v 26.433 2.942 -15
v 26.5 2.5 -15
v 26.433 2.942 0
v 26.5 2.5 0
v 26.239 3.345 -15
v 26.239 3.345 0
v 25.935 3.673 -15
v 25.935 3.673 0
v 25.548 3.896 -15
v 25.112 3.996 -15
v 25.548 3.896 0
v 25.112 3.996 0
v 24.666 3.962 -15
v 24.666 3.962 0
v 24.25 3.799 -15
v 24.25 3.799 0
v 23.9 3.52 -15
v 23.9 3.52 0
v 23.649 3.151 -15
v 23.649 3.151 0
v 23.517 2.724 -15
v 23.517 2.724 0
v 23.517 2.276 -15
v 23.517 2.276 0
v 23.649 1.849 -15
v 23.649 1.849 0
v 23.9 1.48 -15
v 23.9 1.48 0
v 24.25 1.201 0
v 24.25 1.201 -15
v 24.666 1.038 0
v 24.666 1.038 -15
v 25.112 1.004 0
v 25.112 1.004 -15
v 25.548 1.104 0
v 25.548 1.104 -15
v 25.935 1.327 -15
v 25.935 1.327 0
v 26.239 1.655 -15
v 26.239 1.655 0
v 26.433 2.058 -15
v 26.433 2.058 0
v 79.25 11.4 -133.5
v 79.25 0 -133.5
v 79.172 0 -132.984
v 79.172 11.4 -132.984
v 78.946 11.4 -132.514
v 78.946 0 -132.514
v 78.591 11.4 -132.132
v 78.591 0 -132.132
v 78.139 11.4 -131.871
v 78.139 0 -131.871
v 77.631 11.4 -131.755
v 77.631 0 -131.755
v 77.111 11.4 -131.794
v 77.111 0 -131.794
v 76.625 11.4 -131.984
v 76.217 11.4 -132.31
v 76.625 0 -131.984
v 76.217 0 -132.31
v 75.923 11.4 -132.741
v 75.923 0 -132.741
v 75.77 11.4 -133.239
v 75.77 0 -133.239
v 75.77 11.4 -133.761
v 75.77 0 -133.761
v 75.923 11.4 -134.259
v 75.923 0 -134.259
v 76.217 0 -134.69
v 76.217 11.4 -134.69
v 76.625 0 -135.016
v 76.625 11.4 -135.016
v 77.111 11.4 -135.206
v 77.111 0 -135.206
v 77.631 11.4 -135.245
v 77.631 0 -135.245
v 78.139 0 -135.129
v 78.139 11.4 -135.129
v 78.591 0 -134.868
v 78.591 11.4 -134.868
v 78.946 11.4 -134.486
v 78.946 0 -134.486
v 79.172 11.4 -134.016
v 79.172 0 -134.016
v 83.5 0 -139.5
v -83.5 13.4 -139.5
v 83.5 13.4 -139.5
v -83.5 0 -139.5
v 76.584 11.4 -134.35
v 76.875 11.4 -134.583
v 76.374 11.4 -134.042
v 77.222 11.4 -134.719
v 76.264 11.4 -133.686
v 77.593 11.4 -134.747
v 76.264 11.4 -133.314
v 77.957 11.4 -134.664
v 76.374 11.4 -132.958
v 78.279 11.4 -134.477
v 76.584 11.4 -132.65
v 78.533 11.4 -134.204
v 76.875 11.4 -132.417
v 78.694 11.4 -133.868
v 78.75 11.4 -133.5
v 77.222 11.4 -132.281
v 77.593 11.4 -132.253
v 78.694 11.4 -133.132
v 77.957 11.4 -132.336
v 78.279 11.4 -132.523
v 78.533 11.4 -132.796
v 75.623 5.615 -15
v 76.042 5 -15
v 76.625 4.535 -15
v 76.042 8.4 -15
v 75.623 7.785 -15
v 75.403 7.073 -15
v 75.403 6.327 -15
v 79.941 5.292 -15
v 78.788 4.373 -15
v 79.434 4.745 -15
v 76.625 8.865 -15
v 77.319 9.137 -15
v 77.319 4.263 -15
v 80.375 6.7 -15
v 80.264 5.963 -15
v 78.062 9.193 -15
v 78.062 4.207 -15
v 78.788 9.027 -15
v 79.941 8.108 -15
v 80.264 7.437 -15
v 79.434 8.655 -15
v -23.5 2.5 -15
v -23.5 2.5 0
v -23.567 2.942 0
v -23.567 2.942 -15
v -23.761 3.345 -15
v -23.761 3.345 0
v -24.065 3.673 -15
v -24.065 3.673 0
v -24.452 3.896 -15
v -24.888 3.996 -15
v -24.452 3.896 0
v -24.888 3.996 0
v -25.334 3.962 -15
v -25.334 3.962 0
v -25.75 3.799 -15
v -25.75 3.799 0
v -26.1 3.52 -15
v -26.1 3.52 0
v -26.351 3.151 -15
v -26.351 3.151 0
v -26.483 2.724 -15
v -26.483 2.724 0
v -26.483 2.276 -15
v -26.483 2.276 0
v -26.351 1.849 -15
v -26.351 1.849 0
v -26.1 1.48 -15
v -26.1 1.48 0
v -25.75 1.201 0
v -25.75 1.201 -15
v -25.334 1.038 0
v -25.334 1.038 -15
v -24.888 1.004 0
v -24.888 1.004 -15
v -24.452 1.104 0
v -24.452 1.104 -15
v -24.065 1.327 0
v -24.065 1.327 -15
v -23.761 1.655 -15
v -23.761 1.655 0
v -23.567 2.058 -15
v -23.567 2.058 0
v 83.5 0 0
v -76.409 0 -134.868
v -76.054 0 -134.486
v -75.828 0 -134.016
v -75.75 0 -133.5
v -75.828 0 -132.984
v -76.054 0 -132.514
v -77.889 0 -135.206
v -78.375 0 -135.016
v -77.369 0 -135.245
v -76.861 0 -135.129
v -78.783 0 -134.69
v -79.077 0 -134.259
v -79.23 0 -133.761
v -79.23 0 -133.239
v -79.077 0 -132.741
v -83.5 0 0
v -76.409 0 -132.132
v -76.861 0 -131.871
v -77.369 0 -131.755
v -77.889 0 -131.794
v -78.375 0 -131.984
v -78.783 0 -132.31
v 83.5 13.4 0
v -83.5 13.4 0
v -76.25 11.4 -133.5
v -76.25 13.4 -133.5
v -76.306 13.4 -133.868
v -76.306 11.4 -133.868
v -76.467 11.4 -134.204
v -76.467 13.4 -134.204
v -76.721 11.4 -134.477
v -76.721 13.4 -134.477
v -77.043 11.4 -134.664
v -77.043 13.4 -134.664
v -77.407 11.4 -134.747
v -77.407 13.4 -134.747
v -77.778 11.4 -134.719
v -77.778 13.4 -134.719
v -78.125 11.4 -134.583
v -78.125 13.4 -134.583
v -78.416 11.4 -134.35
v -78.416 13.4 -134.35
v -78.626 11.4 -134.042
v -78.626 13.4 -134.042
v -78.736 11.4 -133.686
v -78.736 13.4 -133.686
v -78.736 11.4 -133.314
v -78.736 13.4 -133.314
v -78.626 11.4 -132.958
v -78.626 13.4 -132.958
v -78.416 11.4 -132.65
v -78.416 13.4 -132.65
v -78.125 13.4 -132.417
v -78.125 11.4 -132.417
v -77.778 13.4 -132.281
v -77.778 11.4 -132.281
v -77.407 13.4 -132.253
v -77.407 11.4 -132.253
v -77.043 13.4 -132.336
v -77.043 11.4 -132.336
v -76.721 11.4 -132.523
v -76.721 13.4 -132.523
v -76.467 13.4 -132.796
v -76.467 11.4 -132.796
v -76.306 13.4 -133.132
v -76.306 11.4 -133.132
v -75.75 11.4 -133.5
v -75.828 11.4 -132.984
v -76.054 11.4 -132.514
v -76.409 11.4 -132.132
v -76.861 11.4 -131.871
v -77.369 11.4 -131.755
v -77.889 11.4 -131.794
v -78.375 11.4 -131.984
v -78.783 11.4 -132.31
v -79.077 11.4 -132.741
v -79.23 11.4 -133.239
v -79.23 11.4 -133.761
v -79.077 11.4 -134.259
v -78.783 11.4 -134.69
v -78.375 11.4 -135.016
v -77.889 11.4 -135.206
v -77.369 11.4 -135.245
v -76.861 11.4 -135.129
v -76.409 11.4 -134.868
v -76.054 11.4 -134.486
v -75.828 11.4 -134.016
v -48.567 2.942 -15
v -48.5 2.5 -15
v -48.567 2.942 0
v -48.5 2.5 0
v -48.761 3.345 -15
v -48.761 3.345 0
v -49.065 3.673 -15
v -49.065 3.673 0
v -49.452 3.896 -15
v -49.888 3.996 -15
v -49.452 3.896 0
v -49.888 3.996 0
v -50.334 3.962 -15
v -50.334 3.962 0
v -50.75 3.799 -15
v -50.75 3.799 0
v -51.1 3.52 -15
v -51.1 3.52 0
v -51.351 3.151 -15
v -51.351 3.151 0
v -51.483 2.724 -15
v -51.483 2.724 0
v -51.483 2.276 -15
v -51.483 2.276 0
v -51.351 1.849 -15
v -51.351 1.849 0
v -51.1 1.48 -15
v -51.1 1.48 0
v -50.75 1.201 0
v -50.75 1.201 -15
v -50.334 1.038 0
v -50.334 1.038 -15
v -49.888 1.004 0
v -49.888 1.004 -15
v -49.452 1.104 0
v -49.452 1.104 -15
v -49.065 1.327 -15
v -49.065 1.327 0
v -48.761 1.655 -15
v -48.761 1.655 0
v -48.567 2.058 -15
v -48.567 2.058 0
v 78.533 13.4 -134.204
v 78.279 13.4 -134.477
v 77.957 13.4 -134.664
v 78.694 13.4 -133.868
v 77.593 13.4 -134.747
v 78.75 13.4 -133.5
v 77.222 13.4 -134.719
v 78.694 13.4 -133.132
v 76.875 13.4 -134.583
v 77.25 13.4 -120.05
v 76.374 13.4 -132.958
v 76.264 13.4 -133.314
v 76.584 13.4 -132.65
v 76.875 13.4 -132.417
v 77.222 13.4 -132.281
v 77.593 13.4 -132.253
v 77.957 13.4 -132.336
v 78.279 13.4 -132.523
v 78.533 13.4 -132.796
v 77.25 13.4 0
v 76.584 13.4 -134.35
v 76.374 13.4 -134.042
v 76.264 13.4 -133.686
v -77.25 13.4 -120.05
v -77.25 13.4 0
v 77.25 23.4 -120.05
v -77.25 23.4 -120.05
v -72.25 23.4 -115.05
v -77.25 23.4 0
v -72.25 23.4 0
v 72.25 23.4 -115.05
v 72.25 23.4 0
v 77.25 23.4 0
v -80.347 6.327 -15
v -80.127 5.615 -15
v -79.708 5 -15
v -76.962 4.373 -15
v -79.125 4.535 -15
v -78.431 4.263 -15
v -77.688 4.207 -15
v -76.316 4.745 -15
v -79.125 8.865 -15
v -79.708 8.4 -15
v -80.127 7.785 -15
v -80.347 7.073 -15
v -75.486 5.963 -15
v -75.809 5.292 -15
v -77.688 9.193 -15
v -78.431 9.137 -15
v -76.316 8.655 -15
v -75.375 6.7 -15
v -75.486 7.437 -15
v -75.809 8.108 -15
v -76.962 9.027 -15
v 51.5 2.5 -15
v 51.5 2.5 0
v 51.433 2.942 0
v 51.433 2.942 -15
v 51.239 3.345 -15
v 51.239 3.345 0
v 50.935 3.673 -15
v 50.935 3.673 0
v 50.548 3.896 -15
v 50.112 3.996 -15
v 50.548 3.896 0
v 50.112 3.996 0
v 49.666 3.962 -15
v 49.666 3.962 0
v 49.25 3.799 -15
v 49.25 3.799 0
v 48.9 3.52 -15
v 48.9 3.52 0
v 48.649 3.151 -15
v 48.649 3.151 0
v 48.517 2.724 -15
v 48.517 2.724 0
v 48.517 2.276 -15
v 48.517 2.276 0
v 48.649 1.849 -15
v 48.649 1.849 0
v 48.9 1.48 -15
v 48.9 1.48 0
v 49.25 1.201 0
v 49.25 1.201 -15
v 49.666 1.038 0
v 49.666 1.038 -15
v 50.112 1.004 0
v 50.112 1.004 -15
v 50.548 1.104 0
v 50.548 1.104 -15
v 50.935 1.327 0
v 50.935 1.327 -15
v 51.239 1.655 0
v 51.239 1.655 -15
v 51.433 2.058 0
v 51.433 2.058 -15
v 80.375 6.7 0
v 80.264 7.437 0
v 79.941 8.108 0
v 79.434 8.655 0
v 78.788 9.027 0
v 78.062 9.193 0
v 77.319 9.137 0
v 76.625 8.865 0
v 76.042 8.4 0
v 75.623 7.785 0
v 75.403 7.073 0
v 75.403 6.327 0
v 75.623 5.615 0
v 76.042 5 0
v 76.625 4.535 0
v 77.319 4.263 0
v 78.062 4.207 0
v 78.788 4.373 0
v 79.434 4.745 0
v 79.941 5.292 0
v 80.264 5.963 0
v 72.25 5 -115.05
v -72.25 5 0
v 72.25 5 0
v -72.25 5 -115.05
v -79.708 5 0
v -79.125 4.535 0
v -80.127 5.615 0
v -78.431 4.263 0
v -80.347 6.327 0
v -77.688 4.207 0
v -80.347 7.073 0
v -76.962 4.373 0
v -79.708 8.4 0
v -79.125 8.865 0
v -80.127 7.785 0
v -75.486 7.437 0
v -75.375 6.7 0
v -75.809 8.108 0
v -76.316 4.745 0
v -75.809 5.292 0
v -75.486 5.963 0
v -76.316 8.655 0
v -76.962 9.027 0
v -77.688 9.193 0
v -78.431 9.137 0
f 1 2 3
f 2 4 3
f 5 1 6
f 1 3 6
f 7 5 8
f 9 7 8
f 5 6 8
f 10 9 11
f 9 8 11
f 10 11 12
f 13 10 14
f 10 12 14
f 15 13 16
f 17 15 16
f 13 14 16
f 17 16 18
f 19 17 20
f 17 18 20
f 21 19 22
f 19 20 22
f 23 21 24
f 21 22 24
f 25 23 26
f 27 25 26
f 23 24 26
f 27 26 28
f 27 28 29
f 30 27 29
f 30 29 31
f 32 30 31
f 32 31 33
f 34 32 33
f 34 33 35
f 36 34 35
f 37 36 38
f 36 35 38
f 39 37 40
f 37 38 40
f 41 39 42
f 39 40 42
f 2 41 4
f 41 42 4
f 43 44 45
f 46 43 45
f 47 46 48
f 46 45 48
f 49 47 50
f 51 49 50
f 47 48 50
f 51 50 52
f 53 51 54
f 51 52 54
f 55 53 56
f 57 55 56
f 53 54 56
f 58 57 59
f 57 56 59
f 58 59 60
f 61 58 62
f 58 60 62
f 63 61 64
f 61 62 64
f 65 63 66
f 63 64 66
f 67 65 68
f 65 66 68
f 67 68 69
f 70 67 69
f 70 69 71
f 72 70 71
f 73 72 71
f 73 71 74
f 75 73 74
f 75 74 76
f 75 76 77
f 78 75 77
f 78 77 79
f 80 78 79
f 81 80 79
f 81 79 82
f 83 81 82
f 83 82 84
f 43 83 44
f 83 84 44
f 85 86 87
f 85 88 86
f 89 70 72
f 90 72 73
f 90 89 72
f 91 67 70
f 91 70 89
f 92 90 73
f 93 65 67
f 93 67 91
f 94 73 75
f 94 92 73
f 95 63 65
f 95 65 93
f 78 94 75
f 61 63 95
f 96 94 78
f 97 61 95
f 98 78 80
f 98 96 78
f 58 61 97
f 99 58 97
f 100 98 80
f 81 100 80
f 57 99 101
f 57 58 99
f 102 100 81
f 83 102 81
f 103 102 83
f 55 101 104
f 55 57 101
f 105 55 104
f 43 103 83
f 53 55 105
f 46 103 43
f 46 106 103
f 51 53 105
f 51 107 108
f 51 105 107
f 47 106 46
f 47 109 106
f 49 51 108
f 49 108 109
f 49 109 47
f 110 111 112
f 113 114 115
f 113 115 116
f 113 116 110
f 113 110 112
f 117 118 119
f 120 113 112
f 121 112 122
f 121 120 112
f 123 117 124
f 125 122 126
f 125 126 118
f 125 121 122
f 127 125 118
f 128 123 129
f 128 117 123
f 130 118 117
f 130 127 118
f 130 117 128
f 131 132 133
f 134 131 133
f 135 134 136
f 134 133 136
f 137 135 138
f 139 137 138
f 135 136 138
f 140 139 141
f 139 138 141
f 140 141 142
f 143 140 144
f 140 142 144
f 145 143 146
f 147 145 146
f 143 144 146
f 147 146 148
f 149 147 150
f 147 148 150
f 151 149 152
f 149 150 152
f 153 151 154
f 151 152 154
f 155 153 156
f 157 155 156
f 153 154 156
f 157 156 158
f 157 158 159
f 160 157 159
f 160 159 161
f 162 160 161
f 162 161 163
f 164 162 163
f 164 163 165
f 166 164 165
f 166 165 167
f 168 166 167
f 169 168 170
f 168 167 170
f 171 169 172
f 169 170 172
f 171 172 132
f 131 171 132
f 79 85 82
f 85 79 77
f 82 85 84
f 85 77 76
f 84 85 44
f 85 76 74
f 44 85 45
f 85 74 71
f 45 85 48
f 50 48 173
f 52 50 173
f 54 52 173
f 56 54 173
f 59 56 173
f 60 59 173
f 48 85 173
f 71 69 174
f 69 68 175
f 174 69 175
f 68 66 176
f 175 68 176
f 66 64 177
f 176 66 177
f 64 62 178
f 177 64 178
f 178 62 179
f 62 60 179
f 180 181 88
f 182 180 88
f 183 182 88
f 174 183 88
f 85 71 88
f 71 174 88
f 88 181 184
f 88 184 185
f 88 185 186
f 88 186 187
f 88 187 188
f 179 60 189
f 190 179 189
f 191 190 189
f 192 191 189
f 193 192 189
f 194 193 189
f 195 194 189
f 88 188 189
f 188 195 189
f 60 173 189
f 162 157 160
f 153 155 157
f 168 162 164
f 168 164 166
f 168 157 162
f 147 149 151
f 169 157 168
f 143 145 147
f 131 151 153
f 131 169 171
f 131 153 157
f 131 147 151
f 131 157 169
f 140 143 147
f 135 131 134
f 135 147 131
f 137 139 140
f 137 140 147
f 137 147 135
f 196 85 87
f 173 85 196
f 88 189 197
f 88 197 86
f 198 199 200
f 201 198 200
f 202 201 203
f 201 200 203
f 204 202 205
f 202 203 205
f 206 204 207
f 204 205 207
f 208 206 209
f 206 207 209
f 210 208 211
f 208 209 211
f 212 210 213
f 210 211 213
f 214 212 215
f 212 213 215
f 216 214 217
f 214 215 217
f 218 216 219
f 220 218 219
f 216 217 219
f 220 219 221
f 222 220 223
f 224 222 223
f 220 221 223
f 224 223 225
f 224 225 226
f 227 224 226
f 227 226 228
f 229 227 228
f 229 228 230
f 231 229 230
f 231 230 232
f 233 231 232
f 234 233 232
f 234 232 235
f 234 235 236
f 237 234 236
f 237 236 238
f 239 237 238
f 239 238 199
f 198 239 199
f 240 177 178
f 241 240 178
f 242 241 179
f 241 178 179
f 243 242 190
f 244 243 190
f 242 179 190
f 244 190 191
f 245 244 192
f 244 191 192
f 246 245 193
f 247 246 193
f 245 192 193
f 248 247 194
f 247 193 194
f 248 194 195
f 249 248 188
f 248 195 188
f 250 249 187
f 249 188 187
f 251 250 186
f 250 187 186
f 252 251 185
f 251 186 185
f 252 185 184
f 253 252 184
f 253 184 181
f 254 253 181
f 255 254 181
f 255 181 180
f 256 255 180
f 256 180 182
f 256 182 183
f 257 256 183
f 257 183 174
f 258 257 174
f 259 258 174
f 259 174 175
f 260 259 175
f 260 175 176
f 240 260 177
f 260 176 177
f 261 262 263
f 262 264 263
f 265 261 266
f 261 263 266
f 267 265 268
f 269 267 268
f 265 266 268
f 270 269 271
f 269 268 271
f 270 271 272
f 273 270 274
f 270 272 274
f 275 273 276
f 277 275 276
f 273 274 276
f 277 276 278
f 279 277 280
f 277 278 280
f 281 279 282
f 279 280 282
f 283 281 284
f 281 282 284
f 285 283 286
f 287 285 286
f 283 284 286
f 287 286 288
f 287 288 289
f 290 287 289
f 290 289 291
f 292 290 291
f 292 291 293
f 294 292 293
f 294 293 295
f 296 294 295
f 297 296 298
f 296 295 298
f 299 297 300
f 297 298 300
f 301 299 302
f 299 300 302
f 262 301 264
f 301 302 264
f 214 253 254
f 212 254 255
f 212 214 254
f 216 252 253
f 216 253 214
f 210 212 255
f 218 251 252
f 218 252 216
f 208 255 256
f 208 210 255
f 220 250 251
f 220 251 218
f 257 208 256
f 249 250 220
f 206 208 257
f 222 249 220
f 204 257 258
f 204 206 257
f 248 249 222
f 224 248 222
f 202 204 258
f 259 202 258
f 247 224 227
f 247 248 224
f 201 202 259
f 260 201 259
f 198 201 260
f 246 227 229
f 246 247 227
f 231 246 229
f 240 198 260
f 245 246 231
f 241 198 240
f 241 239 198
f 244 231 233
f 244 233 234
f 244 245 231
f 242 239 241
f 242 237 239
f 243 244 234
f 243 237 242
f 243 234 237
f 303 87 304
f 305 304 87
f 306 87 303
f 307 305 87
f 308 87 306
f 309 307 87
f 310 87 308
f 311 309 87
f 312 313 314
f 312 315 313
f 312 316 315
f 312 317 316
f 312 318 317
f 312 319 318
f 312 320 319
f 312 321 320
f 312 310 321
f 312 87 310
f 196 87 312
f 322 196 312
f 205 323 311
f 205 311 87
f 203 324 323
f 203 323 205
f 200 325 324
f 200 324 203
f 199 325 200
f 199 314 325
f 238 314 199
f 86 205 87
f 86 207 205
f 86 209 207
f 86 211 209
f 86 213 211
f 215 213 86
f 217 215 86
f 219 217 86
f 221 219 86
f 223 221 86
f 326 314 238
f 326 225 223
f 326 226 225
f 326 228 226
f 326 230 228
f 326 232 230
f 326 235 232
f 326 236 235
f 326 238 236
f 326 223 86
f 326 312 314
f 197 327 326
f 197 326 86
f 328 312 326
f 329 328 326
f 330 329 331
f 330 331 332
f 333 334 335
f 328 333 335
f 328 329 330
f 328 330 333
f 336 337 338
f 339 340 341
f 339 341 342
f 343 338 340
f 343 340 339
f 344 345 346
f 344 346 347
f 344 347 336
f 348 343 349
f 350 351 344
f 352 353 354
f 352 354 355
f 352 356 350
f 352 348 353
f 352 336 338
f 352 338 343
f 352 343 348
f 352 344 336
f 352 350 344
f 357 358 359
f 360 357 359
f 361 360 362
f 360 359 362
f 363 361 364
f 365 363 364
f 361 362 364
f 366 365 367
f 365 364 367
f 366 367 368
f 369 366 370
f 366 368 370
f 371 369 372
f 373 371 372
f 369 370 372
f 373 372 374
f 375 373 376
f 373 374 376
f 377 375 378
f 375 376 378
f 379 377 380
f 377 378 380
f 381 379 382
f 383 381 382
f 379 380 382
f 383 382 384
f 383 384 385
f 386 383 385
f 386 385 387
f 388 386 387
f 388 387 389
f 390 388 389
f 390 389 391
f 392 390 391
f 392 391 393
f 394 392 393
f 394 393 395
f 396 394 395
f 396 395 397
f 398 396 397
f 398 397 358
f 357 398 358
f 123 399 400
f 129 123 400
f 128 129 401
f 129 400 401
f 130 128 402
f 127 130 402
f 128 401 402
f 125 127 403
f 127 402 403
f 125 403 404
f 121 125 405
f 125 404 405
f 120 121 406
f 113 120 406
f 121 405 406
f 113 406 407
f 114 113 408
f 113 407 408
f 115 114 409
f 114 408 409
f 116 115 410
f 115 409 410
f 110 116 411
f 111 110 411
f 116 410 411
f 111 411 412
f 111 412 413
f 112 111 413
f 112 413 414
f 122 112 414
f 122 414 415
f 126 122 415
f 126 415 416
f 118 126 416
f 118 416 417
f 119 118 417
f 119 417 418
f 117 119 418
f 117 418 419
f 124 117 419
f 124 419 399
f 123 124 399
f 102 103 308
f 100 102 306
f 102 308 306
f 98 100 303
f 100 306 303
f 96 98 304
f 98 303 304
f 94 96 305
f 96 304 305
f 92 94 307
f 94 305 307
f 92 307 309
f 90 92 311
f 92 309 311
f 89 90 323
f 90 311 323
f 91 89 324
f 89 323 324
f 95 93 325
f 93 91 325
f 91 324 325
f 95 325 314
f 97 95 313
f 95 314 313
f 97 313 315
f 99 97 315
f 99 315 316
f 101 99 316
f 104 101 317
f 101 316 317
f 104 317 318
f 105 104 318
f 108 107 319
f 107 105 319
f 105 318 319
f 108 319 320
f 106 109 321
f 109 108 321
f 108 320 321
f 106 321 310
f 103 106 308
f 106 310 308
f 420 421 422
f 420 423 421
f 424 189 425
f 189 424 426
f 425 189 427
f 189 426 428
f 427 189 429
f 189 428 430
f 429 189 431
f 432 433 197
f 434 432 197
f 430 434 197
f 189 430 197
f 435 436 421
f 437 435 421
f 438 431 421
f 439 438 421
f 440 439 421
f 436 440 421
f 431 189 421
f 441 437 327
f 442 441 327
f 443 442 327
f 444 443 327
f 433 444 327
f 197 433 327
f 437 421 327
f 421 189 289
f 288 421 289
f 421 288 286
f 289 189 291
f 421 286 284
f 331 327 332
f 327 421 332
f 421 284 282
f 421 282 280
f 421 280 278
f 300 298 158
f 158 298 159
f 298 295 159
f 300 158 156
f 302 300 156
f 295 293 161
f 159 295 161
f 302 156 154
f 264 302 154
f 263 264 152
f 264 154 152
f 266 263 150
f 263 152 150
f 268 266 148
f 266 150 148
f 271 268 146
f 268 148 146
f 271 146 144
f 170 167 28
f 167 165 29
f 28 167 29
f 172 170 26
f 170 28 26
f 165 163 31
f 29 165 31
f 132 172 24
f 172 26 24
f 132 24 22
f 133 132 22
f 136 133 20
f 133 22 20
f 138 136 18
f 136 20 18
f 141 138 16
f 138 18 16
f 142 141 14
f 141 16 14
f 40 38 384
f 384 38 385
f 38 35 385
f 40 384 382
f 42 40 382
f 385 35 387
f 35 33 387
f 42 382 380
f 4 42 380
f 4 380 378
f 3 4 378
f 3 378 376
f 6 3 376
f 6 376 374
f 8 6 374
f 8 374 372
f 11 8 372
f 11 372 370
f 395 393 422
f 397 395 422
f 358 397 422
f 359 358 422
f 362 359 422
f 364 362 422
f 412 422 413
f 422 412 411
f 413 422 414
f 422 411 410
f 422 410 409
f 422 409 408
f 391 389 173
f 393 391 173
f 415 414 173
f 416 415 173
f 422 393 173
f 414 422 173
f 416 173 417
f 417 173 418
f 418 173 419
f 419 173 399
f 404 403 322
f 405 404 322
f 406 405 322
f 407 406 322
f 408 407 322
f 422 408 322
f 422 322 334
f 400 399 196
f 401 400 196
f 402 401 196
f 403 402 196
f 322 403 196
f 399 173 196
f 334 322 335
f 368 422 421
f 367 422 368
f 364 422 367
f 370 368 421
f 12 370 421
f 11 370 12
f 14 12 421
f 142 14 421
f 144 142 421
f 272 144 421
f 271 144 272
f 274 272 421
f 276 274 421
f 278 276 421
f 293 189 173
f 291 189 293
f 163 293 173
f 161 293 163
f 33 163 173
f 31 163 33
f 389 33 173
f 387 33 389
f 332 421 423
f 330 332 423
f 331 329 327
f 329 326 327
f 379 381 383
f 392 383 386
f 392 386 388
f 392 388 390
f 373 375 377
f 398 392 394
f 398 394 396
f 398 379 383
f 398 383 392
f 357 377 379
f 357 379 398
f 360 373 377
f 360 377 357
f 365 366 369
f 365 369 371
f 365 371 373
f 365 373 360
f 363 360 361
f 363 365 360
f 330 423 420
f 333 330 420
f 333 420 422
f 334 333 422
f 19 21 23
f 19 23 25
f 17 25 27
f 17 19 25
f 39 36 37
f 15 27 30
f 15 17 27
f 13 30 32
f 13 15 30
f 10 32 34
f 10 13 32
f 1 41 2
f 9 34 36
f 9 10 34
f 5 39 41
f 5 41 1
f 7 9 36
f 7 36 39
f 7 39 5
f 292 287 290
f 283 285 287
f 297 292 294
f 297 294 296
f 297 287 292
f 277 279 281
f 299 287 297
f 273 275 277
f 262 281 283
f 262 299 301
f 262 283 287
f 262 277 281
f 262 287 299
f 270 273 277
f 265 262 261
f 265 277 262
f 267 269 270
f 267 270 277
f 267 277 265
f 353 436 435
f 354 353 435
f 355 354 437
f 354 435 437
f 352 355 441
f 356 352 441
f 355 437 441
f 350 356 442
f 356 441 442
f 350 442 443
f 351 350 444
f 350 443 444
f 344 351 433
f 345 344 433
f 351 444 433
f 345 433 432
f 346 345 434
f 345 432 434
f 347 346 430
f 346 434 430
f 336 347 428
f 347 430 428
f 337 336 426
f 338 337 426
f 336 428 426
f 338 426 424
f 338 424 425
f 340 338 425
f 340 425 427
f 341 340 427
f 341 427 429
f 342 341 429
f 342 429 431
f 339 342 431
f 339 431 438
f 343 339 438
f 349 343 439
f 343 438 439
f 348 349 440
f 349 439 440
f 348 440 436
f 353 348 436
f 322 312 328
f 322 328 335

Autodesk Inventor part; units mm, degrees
ref_plane "YZ Plane" through (0, 0, 0) normal (1, 0, 0) x (0, 1, 0)
ref_plane "XZ Plane" through (0, 0, 0) normal (0, 1, 0) x (-1, 0, 0)
sketch "Sketch1" plane through (0, 0, 0) normal (0, 1, 0) x (-1, 0, 0)
  line L0 (-83.5, 139.5) -> (83.5, 139.5)
  line L1 (83.5, 139.5) -> (83.5, -139.5)
  line L2 (83.5, -139.5) -> (-83.5, -139.5)
  line L3 (-83.5, -139.5) -> (-83.5, 139.5)
  line L4 (-83.5, 139.5) -> (83.5, -139.5) construction
  line L5 (83.5, 139.5) -> (-83.5, -139.5) construction
  point P0 (0, 0)
  dimension "d0" = 167
  dimension "d1" = 279
extrude "Extrusion1" add sketch "Sketch1" along normal blind 13.4
sketch "Sketch2" plane through (0, 13.4, 0) normal (0, 1, 0) x (1, 0, 0)
  line L0 (72.25, -115.05) -> (-72.25, -115.05)
  line L1 (-72.25, -115.05) -> (-72.25, 115.05)
  line L2 (-72.25, 115.05) -> (72.25, 115.05)
  line L3 (72.25, 115.05) -> (72.25, -115.05)
  line L4 (72.25, -115.05) -> (-72.25, 115.05) construction
  line L5 (-72.25, -115.05) -> (72.25, 115.05) construction
  point P0 (0, 0)
  dimension "d4" = 144.5
  dimension "d5" = 230.1
extrude "Extrusion2" cut sketch "Sketch2" against normal blind 8.4
sketch "Sketch4" plane through (0, 13.4, 0) normal (0, 1, 0) x (1, 0, 0)
  circle A0 centre (-77.5, -133.5) radius 1.25
  line L0 (-83.5, 139.5) -> (-83.5, -139.5) projected
  line L1 (-83.5, -139.5) -> (83.5, -139.5) projected
  circle A1 centre (-77.5, 133.5) radius 1.25
  line L2 (83.5, 139.5) -> (-83.5, 139.5) projected
  circle A2 centre (77.5, 133.5) radius 1.25
  line L3 (83.5, -139.5) -> (83.5, 139.5) projected
  circle A3 centre (77.5, -133.5) radius 1.25
  point P0 (0, 0)
  dimension "d16" = 2.5
  dimension "d17" = 6
  dimension "d18" = 6
  dimension "d19" = 2.5
  dimension "d20" = 6
  dimension "d21" = 6
  dimension "d22" = 2.5
  dimension "d23" = 6
  dimension "d24" = 6
  dimension "d25" = 2.5
  dimension "d26" = 6
  dimension "d27" = 6
extrude "Extrusion4" cut sketch "Sketch4" against normal through all contours A0 | A1 | A2 | A3
sketch "Sketch5" plane through (0, 13.4, 0) normal (0, 1, 0) x (1, 0, 0)
  line L0 (-72.25, -115.05) -> (-72.25, 115.05) projected
  line L1 (72.25, -115.05) -> (-72.25, -115.05) projected
  line L2 (-77.25, -120.05) -> (-72.25, -120.05)
  line L3 (-72.25, -120.05) -> (-72.25, 120.05)
  line L4 (-72.25, 120.05) -> (-77.25, 120.05)
  line L5 (-77.25, 120.05) -> (-77.25, -120.05)
  line L6 (72.25, 115.05) -> (72.25, -115.05) projected
  line L7 (77.25, -120.05) -> (72.25, -120.05)
  line L8 (72.25, -120.05) -> (72.25, 120.05)
  line L9 (72.25, 120.05) -> (77.25, 120.05)
  line L10 (77.25, 120.05) -> (77.25, -120.05)
  line L11 (-72.25, 115.05) -> (72.25, 115.05) projected
  line L12 (72.25, 120.05) -> (-72.25, 120.05)
  line L13 (-72.25, 120.05) -> (-72.25, 115.05)
  line L14 (-72.25, 115.05) -> (72.25, 115.05)
  line L15 (72.25, 115.05) -> (72.25, 120.05)
  line L16 (-72.25, -115.05) -> (72.25, -115.05)
  line L17 (72.25, -115.05) -> (72.25, -120.05)
  line L18 (72.25, -120.05) -> (-72.25, -120.05)
  line L19 (-72.25, -120.05) -> (-72.25, -115.05)
  point P0 (0, 0)
  dimension "d30" = 5
  dimension "d31" = 5
  dimension "d32" = 240.1
  dimension "d33" = 5
  dimension "d34" = 5
  dimension "d35" = 240.1
extrude "Extrusion5" add sketch "Sketch5" along normal blind 10 contours L3 L2 L5 L4 L0 | L1 L8 L18 L3 | L3 L12 L8 L11 | L6 L8 L9 L10 L7
sketch "Sketch7" plane through (0, 0, 0) normal (0, -1, 0) x (1, 0, 0)
  circle A0 centre (-77.5, -133.5) radius 1.25 projected
  circle A1 centre (-77.5, -133.5) radius 1.75
  circle A2 centre (-77.5, 133.5) radius 1.25 projected
  circle A3 centre (-77.5, 133.5) radius 1.75
  circle A4 centre (77.5, 133.5) radius 1.25 projected
  circle A5 centre (77.5, 133.5) radius 1.75
  circle A6 centre (77.5, -133.5) radius 1.25 projected
  circle A7 centre (77.5, -133.5) radius 1.75
  point P0 (0, 0)
  dimension "d42" = 3.5
  dimension "d43" = 3.5
  dimension "d44" = 3.5
  dimension "d45" = 3.5
extrude "Extrusion6" cut sketch "Sketch7" against normal blind 11.4 contours A0 | A1 | A2 | A3 | A4 | A5 | A7
sketch "Sketch8" plane through (83.5, 0, 139.5) normal (1, 0, 0) x (0, 0, -1)
  line L0 (139.5, 0) -> (139.5, 13.4)
  line L1 (0, 13.4) -> (279, 13.4) projected
sketch "Sketch9" plane through (0, 13.4, 0) normal (0, 1, 0) x (1, 0, 0)
  line L0 (83.5, -139.5) -> (83.5, 139.5) projected
  line L1 (83.5, 0) -> (77.25, 0)
  line L2 (77.25, 120.05) -> (77.25, -120.05) projected
  point P0 (0, 0)
sketch "Sketch10" plane through (77.25, 13.4, 120.05) normal (1, 0, 0) x (0, 0, -1)
  line L0 (-19.45, 0) -> (259.55, 0) projected
  line L1 (120.05, 0) -> (120.05, 10)
  line L2 (0, 10) -> (240.1, 10) projected
  point P0 (120.05, -13.4)
split_face "Split1"
split_face "Split2"
split_face "Split3"
ref_plane "Work Plane1" through (83.5, 0, -139.5) normal (1, 0, 0) x (0, 0, -1)
sketch "Sketch11" plane through (83.5, 0, -139.5) normal (1, 0, 0) x (0, 0, -1)
  line L0 (0, 0) -> (0, 13.4) projected
  line L1 (-139.5, 5) -> (-139.5, 23.4) projected
  line L2 (0, 0) -> (-139.5, 0)
  line L3 (-139.5, 0) -> (-139.5, 23.4)
  line L4 (-139.5, 23.4) -> (0, 23.4)
  line L5 (0, 23.4) -> (0, 0)
  line L6 (-279, 0) -> (-139.5, 0) projected
  line L7 (-259.55, 23.4) -> (-139.5, 23.4) projected
  line L8 (-279, 0) -> (-139.5, 0)
  line L9 (-139.5, 0) -> (-139.5, 23.4)
  line L10 (-139.5, 23.4) -> (-279, 23.4)
  line L11 (-279, 23.4) -> (-279, 0)
extrude "Extrusion7" cut sketch "Sketch11" against normal blind 167.1625 contours L6 L11 L10 L7 L1 L3
sketch "Sketch12" plane through (-83.5, 0, 0) normal (0, 0, 1) x (1, 0, 0)
  line L0 (0, 0) -> (0, 13.4) projected
  line L1 (11.25, 5) -> (11.25, 23.4) projected
  circle A0 centre (5.625, 6.7) radius 2.5
  line L2 (167, 0) -> (167, 13.4) projected
  circle A1 centre (161.375, 6.7) radius 2.5
  line L3 (11.25, 5) -> (155.75, 5) projected
  circle A2 centre (58.5, 2.5) radius 1.5
  circle A3 centre (33.5, 2.5) radius 1.5
  circle A4 centre (108.5, 2.5) radius 1.5
  circle A5 centre (133.5, 2.5) radius 1.5
  point P0 (83.5, 0)
  dimension "d51" = 5
  dimension "d53" = 5
  dimension "d55" = 3
  dimension "d57" = 3
  dimension "d59" = 3
  dimension "d61" = 3
extrude "Extrusion8" cut sketch "Sketch12" against normal blind 15
properties part number "Enclosure 2 Bottom" material "ABS Plastic"
